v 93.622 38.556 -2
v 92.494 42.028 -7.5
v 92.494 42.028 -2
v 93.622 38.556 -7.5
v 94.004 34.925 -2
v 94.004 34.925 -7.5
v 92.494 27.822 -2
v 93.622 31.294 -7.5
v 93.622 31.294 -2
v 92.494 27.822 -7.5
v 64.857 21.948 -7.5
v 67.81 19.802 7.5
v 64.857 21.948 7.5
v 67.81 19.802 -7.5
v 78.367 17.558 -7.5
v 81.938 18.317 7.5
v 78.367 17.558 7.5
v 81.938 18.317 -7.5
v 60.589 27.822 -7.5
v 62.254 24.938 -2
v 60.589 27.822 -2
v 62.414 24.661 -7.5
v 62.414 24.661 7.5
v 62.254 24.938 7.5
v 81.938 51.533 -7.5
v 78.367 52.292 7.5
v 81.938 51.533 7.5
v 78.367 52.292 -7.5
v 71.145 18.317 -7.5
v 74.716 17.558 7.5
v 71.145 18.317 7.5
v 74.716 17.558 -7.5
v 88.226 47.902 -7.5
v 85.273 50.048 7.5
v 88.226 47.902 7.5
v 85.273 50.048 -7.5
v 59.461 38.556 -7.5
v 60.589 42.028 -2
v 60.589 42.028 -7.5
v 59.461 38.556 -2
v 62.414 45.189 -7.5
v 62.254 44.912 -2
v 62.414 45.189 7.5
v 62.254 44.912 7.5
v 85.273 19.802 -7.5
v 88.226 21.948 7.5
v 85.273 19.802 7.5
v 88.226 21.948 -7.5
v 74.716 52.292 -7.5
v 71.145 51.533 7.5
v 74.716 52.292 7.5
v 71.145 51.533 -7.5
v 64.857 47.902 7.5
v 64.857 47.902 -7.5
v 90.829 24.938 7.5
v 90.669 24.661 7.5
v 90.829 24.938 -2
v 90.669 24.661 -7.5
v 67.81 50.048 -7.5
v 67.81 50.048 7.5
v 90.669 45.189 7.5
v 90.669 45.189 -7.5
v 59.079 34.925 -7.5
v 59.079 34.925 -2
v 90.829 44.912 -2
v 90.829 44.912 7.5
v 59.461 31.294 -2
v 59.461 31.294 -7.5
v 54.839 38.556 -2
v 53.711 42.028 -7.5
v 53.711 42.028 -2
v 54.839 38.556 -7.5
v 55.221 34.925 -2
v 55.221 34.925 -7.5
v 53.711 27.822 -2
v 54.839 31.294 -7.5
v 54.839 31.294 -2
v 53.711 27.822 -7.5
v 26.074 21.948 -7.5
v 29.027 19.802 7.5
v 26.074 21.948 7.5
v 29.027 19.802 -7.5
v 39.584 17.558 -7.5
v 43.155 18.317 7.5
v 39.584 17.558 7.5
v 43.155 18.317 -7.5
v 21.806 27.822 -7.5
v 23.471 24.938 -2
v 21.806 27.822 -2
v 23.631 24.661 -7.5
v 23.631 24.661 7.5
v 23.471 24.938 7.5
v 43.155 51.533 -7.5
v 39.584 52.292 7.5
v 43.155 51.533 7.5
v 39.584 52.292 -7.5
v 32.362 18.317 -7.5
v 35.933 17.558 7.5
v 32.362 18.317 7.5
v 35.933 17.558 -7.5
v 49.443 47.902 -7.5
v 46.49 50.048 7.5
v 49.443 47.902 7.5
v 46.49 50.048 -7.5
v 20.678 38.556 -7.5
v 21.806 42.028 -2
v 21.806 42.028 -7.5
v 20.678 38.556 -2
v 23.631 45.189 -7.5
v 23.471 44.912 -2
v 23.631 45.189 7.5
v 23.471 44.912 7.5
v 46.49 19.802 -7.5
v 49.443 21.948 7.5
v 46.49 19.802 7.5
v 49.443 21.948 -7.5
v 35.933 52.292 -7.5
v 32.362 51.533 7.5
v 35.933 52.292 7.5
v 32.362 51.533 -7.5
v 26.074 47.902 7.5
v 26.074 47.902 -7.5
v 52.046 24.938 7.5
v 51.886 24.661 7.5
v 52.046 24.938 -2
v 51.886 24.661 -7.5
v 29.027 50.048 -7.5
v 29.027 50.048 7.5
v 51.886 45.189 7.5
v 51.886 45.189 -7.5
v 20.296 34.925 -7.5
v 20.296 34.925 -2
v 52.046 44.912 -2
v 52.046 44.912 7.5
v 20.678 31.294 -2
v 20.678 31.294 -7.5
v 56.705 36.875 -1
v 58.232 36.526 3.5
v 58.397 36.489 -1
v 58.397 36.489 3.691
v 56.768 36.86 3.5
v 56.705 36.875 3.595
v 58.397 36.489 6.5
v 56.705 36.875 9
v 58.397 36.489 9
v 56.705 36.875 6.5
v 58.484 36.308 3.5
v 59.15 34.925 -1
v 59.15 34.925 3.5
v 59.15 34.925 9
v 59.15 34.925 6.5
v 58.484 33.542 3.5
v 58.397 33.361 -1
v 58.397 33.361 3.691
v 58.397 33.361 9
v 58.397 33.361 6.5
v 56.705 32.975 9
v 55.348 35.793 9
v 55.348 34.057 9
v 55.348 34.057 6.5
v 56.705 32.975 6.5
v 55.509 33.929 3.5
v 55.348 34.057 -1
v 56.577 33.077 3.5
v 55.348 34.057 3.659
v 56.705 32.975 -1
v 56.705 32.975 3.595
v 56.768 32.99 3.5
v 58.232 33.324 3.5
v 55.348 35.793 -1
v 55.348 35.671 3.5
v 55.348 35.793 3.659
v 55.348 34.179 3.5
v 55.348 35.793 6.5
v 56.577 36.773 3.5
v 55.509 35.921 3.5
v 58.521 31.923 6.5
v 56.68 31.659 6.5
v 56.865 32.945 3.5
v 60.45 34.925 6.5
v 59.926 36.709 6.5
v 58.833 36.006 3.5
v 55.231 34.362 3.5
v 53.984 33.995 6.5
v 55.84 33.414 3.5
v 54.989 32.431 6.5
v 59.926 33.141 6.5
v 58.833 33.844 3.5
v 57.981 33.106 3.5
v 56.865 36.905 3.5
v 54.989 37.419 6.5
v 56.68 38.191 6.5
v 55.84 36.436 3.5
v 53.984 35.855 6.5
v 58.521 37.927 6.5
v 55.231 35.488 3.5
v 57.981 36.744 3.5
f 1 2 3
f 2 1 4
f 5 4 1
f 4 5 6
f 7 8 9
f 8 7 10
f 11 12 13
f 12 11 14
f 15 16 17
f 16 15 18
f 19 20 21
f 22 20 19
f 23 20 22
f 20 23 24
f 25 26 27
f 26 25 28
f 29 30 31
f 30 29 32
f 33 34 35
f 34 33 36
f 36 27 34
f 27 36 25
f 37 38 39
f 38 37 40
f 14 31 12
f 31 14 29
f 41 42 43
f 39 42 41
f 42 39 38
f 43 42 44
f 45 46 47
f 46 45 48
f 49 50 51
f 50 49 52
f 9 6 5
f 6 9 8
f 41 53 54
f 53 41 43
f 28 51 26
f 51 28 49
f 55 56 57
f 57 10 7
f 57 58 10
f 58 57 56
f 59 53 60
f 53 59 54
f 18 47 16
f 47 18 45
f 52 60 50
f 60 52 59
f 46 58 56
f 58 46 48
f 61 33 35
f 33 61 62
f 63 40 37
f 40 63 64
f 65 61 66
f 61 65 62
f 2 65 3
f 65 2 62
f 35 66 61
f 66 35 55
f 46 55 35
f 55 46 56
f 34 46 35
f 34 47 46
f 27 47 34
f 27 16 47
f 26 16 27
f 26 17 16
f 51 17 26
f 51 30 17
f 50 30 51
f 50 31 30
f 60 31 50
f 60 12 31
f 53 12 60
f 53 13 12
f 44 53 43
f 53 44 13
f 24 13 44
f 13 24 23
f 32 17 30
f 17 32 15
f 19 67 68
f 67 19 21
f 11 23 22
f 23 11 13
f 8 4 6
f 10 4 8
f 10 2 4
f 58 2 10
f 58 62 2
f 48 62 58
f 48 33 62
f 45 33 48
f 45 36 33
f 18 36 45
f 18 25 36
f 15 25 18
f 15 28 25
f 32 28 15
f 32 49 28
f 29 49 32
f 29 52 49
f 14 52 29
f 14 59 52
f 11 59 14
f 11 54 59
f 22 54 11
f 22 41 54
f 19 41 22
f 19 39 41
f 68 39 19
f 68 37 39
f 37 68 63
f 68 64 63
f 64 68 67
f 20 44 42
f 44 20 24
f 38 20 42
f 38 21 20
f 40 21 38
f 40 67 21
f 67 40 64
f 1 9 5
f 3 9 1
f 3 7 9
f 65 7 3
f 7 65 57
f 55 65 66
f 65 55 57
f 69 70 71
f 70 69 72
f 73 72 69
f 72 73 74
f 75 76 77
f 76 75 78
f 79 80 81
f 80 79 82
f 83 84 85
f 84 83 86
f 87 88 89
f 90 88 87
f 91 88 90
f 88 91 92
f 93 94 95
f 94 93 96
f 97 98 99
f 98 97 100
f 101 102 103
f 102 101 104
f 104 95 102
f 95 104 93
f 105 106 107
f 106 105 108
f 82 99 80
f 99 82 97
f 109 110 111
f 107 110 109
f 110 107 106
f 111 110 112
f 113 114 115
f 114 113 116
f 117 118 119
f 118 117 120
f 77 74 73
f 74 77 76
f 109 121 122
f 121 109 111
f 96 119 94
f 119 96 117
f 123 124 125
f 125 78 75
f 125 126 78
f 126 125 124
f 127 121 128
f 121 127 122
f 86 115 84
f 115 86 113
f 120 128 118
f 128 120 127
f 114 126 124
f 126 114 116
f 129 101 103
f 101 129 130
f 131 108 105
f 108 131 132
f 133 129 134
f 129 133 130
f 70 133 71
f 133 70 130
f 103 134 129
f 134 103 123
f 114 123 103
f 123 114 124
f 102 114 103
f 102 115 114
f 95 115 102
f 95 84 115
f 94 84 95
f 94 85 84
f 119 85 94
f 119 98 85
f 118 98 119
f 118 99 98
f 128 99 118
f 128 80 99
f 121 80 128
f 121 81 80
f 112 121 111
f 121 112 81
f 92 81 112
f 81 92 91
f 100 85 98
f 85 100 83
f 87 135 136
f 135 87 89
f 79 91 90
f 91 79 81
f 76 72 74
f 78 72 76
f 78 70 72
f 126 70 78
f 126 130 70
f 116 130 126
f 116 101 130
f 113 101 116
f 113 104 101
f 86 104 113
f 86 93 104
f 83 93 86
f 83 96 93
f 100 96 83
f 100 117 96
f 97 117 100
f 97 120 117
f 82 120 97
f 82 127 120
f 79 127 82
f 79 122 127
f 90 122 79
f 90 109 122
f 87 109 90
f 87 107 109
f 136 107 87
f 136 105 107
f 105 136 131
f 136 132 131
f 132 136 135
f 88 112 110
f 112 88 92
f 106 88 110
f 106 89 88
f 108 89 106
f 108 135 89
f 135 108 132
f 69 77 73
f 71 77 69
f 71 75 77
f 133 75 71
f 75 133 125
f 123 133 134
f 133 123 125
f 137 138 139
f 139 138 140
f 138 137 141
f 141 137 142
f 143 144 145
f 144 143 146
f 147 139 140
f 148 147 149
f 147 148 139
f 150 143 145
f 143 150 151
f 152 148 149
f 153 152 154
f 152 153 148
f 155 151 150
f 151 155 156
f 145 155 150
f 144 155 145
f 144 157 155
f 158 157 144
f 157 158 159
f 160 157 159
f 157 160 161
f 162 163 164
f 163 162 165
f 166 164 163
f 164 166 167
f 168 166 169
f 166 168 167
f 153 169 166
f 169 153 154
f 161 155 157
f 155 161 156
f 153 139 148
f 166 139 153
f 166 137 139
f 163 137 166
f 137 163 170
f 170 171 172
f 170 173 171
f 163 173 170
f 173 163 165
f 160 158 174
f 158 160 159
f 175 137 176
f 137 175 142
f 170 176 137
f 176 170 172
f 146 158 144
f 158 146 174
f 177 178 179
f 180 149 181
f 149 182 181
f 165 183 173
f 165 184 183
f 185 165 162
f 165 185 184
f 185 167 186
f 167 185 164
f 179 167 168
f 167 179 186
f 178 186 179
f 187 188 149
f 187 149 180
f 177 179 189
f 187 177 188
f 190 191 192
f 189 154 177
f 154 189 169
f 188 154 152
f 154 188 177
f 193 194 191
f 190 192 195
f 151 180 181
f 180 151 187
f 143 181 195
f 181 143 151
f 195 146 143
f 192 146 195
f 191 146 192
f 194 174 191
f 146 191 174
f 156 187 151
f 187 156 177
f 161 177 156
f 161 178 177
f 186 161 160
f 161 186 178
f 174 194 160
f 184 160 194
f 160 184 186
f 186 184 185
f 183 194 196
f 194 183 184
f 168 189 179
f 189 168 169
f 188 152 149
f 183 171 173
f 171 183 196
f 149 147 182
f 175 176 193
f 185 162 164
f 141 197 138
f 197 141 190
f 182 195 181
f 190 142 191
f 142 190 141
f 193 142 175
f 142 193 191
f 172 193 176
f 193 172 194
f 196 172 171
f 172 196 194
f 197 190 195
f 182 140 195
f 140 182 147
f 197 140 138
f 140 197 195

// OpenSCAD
// The dimentions are from the model made at TheNewHobbyist at
//      https://www.printables.com/model/72079-wally-wall-plate-customizer


//TODO: Comment to TheNewHobbyist about the 'go away Customizer' comment

1st_plate = "keystone1";

1st_plate_bottom_hole = "outlet";


l_offset = [34.925,39.6875,44.45];
r_offset = [34.925,39.6875,44.45];



// Bigger hole in your wall? Try this
plate_size = 0; // [0:Standard, 1:Junior-Jumbo, 2:Jumbo]

height_sizes = [114.3,123.825,133.35];

height = 114.3; //plate height (static)


plate1();//1st_plate = 1st_plate,            1st_plate_bottom_hole = 1st_plate_bottom_hole);

// plate1_solid(1st_plate = 1st_plate,
//              1st_plate_bottom_hole = 1st_plate_bottom_hole);

module plate1_solid()
{
    if (1st_plate == "keystone1" && 1st_plate_bottom_hole == "none") {
        translate([height_sizes[plate_size]/2 + 14.3,l_offset[plate_size] - 11.5,-3.9]) hole("keystone_solid");
        }
    else if (1st_plate == "keystone1" && 1st_plate_bottom_hole != "outlet" && 1st_plate_bottom_hole != "toggle" && 1st_plate_bottom_hole != "rocker") 
    {
        translate([height_sizes[plate_size]/2,l_offset[plate_size] - 11.5,-3.9]) hole("keystone_solid");
    }
    if (1st_plate_bottom_hole == "keystone1" && 1st_plate == "none") {
        translate([height_sizes[plate_size]/2 + 14.3,l_offset[plate_size] - 11.5,-3.9]) hole("keystone_solid");
        }
    else if (1st_plate_bottom_hole == "keystone1" && 1st_plate != "outlet" && 1st_plate != "toggle" && 1st_plate != "rocker") {
        translate([height_sizes[plate_size]/2 + 28.5,l_offset[plate_size] - 11.5,-3.9]) hole("keystone_solid");
	}
}



module outletCutout()
{
    hole_type = "outlet";


    // Duplex power outlet plate or dual side toggles
    if (hole_type == "outlet" || hole_type == "dualsidetoggle") 
    {
            translate([height_sizes[plate_size]/2 + 19.3915,0,0]) 
            {
                difference() {
                    cylinder(r=17.4625, h=15, center = true);
                    translate([-24.2875,-15,-2]) cube([10,37,15], center = false);
                    translate([14.2875,-15,-2]) cube([10,37,15], center = false);
                                    }
                                
            }
            
            translate([height_sizes[plate_size]/2 - 19.3915,0,0])
            {
                difference(){
                    cylinder(r=17.4625, h=15, center = true);
                    translate([-24.2875,-15,-2]) cube([10,37,15], center = false);
                    translate([14.2875,-15,-2]) cube([10,37,15], center = false);
                                    }
            }
            
            translate([height_sizes[plate_size]/2,0,-1]) cylinder(r=2, h=10);
            translate([height_sizes[plate_size]/2,0,3.5]) cylinder(r1=2, r2=3.3, h=3);                    
    }
}




module plate1(){
	if (1st_plate == "toggle" || 1st_plate_bottom_hole == "toggle"){
		translate([0,l_offset[plate_size],0]) toggle_screws();
		translate([0,l_offset[plate_size],0]) hole("toggle");
		}
	else if (1st_plate == "long_toggle" || 1st_plate_bottom_hole == "long_toggle"){
		translate([0,l_offset[plate_size],0]) toggle_screws();
		translate([0,l_offset[plate_size],0]) hole("long_toggle");
		}
	else if (1st_plate == "rocker" || 1st_plate_bottom_hole == "rocker"){
		translate([0,l_offset[plate_size],0]) rocker_screws();
		translate([0,l_offset[plate_size],0]) hole("rocker");
		}
	else if (1st_plate == "outlet" || 1st_plate_bottom_hole == "outlet") {
	translate([0,l_offset[plate_size],0]) hole("outlet");
	}
	else if (1st_plate_bottom_hole == "none") {
		translate([0,l_offset[plate_size],0]) box_screws();
		translate([positions[0],l_offset[plate_size],0]) hole(1st_plate);
			}
	else if (1st_plate == "none") {
		translate([0,l_offset[plate_size],0]) box_screws();
		translate([positions[0],l_offset[plate_size],0]) hole(1st_plate_bottom_hole);
			}
	else {
	translate([0,l_offset[plate_size],0]) box_screws();
	translate([positions[1],l_offset[plate_size],0]) hole(1st_plate);
	translate([positions[2],l_offset[plate_size],0]) hole(1st_plate_bottom_hole);
	}
}





// remove the other stuff
// Hole Cutout definitions
module hole(hole_type) 
{
//    echo("hole-1");

// Toggle switch hole
	if (hole_type == "toggle") {
		translate([height_sizes[plate_size]/2,0,0]) cube([23.8125,10.3188,15], center = true);
		 						}

// Toggle switch hole and screw holes
	if (hole_type == "long_toggle") {
		translate([height_sizes[plate_size]/2,0,0]) cube([43.6563,11.9063,15], center = true);
		 						}

// Rocker switch plate
	if (hole_type == "rocker") {
		translate([height_sizes[plate_size]/2,0,0]) cube([67.1,33.3,15], center = true);

		 						}

// Duplex power outlet plate or dual side toggles
	if (hole_type == "outlet" || hole_type == "dualsidetoggle") {
		translate([height_sizes[plate_size]/2 + 19.3915,0,0]) {
			difference() {
				cylinder(r=17.4625, h=15, center = true);
				translate([-24.2875,-15,-2]) cube([10,37,15], center = false);
				translate([14.2875,-15,-2]) cube([10,37,15], center = false);
								}
							}
		translate([height_sizes[plate_size]/2 - 19.3915,0,0]){
			difference(){
				cylinder(r=17.4625, h=15, center = true);
				translate([-24.2875,-15,-2]) cube([10,37,15], center = false);
				translate([14.2875,-15,-2]) cube([10,37,15], center = false);
								}
							}
		translate([height_sizes[plate_size]/2,0,-1]) cylinder(r=2, h=10);
		translate([height_sizes[plate_size]/2,0,3.5]) cylinder(r1=2, r2=3.3, h=3);
							}

// Blank plate
	if (hole_type == "blank") { }

// VGA & DB09 plate
// VGA Fits http://www.datapro.net/products/vga-dual-panel-mount-f-f-cable.html
// DB09 Fits http://www.datapro.net/products/db9-serial-panel-mount-male-extension.html
	if (hole_type == "vga" || hole_type == "db09") {

			translate([0,-12.5,3]) cylinder(r=1.75, h=10, center = true);
			translate([0,12.5,3]) cylinder(r=1.75, h=10, center = true);
				difference(){
					cube([10,19,13], center=true);
					translate([-5,-9.2,1]) rotate([0,0,-35.6]) cube([4.4,2.4,15], center=true);
					translate([.9,-11.2,0]) rotate([0,0,9.6]) cube([10,4.8,15], center=true);
					translate([4.6,-8.5,0]) rotate([0,0,37.2]) cube([4.4,2.4,15], center=true);
					translate([-5,9.2,1]) rotate([0,0,35.6]) cube([4.4,2.4,15], center=true);
					translate([0.9,11.2,0]) rotate([0,0,-9.6]) cube([10,4.8,15], center=true);
					translate([4.6,8.5,0]) rotate([0,0,-37.2]) cube([4.4,2.4,15], center=true);
								}
						}

// HDMI plate
// Fits http://www.datapro.net/products/hdmi-panel-mount-extension-cable.html
	if (hole_type == "hdmi") {
		translate([0,-13,3]) cylinder(r=1.75, h=10, center = true);
		translate([0,13,3]) cylinder(r=1.75, h=10, center = true);
		translate([0,0,3]) cube([6,16,10], center=true);
							}

// DVI-I plate
// Fits http://www.datapro.net/products/dvi-i-panel-mount-extension-cable.html
	if (hole_type == "dvi") {
		translate([0,-16,3]) cylinder(r=1.75, h=10, center = true);
		translate([0,16,3]) cylinder(r=1.75, h=10, center = true);
		translate([0,0,3]) cube([10,26,10], center=true);
							}

// DisplayPort plate
// Fits http://www.datapro.net/products/dvi-i-panel-mount-extension-cable.html
	if (hole_type == "displayport") {
		translate([0,-13.5,3]) cylinder(r=1.75, h=10, center = true);
		translate([0,13.5,3]) cylinder(r=1.75, h=10, center = true);
		translate([0,0,0]){
			difference(){
				translate([0,0,3]) cube([7,19,10], center=true);
				translate([2.47,-9.37,3]) rotate([0,0,-54.6]) cube([3,5,14], center=true);
						}
								}
									}

// USB-A Plate
// Fits http://www.datapro.net/products/usb-panel-mount-type-a-cable.html
	if (hole_type == "usb-a") {
		translate([0,-15,3]) cylinder(r=1.75, h=10, center = true);
		translate([0,15,3]) cylinder(r=1.75, h=10, center = true);
		translate([0,0,3]) cube([8,16,10], center=true);
							}

// USB-B Plate
// Fits http://www.datapro.net/products/usb-panel-mount-type-b-cable.html
	if (hole_type == "usb-b") {
		translate([0,-13,3]) cylinder(r=1.75, h=10, center = true);
		translate([0,13,3]) cylinder(r=1.75, h=10, center = true);
		translate([0,0,3]) cube([11,12,10], center=true);
							}

// 1394 Firewire Plate
// Fits http://www.datapro.net/products/firewire-panel-mount-extension.html
	if (hole_type == "firewire") {
		translate([0,-13.5,3]) cylinder(r=1.75, h=10, center = true);
		translate([0,13.5,3]) cylinder(r=1.75, h=10, center = true);
		translate([0,0,3]) cube([7,12,10], center=true);
							}

// F-Type / Cable TV Plate
// Fits http://www.datapro.net/products/f-type-panel-mounting-coupler.html
	if (hole_type == "f-type") {
		translate([0,0,3]) cylinder(r=4.7625, h=10, center=true);
							}

// Cat5e & Gat6 plate
// Cat5e Fits http://www.datapro.net/products/cat-5e-panel-mount-ethernet.html
// Cat6 Fits hhttp://www.datapro.net/products/cat-6-panel-mount-ethernet.html
	if (hole_type == "cat5e" || hole_type == "cat6") {
		translate([0,-12.5,3]) cylinder(r=1.75, h=10, center = true);
		translate([0,12.5,3]) cylinder(r=1.75, h=10, center = true);
		translate([0,0,3]) cube([15,15,10], center=true);
		}

// S-Video & PS2 plate
// S-Video Fits hhttp://www.datapro.net/products/cat-6-panel-mount-ethernet.html
// PS2 http://www.datapro.net/products/ps2-panel-mount-extension-cable.html
	if (hole_type == "svideo" || hole_type == "ps2") {
		translate([0,-10,3]) cylinder(r=1.75, h=10, center = true);
		translate([0,10,3]) cylinder(r=1.75, h=10, center = true);
		translate([0,0,3]) cylinder(r=5, h=10, center=true);
		}


// Stereo / 1/4" headphone jack coupler
// Stereo coupler Fits http://www.datapro.net/products/stereo-panel-mount-coupler.html
	if (hole_type == "stereo") {
		translate([0,0,3]) cylinder(r=2.985, h=10, center=true);
		}

//Keystone1 hole
//Hole for 1 Keystone Jack
	if (hole_type == "keystone1") {
		translate([0,0,5]) cube([16.5,15,10], center = true);
	}

//Keystone Solid
	if (hole_type == "keystone_solid") {
		rotate([0,0,90]) {
			difference(){
				translate([0,0,.1]) cube([23,30.5,9.8]);
					translate([4,4,0]){
						difference(){
							cube([15,22.5,10]);
							translate([-1,-0.001,3.501]) cube([17,2,6.5]);
							translate([-1,2.5,-3.40970]) rotate([45,0,0]) cube([17,2,6.5]);
							translate([-1,18.501,6.001]) cube([17,4,4]);
							translate([-1,20.5,0]) rotate([-45,0,0]) cube([17,2,6.5]);
						}
					}
				}
			}
		}

//End of module "hole"
}
